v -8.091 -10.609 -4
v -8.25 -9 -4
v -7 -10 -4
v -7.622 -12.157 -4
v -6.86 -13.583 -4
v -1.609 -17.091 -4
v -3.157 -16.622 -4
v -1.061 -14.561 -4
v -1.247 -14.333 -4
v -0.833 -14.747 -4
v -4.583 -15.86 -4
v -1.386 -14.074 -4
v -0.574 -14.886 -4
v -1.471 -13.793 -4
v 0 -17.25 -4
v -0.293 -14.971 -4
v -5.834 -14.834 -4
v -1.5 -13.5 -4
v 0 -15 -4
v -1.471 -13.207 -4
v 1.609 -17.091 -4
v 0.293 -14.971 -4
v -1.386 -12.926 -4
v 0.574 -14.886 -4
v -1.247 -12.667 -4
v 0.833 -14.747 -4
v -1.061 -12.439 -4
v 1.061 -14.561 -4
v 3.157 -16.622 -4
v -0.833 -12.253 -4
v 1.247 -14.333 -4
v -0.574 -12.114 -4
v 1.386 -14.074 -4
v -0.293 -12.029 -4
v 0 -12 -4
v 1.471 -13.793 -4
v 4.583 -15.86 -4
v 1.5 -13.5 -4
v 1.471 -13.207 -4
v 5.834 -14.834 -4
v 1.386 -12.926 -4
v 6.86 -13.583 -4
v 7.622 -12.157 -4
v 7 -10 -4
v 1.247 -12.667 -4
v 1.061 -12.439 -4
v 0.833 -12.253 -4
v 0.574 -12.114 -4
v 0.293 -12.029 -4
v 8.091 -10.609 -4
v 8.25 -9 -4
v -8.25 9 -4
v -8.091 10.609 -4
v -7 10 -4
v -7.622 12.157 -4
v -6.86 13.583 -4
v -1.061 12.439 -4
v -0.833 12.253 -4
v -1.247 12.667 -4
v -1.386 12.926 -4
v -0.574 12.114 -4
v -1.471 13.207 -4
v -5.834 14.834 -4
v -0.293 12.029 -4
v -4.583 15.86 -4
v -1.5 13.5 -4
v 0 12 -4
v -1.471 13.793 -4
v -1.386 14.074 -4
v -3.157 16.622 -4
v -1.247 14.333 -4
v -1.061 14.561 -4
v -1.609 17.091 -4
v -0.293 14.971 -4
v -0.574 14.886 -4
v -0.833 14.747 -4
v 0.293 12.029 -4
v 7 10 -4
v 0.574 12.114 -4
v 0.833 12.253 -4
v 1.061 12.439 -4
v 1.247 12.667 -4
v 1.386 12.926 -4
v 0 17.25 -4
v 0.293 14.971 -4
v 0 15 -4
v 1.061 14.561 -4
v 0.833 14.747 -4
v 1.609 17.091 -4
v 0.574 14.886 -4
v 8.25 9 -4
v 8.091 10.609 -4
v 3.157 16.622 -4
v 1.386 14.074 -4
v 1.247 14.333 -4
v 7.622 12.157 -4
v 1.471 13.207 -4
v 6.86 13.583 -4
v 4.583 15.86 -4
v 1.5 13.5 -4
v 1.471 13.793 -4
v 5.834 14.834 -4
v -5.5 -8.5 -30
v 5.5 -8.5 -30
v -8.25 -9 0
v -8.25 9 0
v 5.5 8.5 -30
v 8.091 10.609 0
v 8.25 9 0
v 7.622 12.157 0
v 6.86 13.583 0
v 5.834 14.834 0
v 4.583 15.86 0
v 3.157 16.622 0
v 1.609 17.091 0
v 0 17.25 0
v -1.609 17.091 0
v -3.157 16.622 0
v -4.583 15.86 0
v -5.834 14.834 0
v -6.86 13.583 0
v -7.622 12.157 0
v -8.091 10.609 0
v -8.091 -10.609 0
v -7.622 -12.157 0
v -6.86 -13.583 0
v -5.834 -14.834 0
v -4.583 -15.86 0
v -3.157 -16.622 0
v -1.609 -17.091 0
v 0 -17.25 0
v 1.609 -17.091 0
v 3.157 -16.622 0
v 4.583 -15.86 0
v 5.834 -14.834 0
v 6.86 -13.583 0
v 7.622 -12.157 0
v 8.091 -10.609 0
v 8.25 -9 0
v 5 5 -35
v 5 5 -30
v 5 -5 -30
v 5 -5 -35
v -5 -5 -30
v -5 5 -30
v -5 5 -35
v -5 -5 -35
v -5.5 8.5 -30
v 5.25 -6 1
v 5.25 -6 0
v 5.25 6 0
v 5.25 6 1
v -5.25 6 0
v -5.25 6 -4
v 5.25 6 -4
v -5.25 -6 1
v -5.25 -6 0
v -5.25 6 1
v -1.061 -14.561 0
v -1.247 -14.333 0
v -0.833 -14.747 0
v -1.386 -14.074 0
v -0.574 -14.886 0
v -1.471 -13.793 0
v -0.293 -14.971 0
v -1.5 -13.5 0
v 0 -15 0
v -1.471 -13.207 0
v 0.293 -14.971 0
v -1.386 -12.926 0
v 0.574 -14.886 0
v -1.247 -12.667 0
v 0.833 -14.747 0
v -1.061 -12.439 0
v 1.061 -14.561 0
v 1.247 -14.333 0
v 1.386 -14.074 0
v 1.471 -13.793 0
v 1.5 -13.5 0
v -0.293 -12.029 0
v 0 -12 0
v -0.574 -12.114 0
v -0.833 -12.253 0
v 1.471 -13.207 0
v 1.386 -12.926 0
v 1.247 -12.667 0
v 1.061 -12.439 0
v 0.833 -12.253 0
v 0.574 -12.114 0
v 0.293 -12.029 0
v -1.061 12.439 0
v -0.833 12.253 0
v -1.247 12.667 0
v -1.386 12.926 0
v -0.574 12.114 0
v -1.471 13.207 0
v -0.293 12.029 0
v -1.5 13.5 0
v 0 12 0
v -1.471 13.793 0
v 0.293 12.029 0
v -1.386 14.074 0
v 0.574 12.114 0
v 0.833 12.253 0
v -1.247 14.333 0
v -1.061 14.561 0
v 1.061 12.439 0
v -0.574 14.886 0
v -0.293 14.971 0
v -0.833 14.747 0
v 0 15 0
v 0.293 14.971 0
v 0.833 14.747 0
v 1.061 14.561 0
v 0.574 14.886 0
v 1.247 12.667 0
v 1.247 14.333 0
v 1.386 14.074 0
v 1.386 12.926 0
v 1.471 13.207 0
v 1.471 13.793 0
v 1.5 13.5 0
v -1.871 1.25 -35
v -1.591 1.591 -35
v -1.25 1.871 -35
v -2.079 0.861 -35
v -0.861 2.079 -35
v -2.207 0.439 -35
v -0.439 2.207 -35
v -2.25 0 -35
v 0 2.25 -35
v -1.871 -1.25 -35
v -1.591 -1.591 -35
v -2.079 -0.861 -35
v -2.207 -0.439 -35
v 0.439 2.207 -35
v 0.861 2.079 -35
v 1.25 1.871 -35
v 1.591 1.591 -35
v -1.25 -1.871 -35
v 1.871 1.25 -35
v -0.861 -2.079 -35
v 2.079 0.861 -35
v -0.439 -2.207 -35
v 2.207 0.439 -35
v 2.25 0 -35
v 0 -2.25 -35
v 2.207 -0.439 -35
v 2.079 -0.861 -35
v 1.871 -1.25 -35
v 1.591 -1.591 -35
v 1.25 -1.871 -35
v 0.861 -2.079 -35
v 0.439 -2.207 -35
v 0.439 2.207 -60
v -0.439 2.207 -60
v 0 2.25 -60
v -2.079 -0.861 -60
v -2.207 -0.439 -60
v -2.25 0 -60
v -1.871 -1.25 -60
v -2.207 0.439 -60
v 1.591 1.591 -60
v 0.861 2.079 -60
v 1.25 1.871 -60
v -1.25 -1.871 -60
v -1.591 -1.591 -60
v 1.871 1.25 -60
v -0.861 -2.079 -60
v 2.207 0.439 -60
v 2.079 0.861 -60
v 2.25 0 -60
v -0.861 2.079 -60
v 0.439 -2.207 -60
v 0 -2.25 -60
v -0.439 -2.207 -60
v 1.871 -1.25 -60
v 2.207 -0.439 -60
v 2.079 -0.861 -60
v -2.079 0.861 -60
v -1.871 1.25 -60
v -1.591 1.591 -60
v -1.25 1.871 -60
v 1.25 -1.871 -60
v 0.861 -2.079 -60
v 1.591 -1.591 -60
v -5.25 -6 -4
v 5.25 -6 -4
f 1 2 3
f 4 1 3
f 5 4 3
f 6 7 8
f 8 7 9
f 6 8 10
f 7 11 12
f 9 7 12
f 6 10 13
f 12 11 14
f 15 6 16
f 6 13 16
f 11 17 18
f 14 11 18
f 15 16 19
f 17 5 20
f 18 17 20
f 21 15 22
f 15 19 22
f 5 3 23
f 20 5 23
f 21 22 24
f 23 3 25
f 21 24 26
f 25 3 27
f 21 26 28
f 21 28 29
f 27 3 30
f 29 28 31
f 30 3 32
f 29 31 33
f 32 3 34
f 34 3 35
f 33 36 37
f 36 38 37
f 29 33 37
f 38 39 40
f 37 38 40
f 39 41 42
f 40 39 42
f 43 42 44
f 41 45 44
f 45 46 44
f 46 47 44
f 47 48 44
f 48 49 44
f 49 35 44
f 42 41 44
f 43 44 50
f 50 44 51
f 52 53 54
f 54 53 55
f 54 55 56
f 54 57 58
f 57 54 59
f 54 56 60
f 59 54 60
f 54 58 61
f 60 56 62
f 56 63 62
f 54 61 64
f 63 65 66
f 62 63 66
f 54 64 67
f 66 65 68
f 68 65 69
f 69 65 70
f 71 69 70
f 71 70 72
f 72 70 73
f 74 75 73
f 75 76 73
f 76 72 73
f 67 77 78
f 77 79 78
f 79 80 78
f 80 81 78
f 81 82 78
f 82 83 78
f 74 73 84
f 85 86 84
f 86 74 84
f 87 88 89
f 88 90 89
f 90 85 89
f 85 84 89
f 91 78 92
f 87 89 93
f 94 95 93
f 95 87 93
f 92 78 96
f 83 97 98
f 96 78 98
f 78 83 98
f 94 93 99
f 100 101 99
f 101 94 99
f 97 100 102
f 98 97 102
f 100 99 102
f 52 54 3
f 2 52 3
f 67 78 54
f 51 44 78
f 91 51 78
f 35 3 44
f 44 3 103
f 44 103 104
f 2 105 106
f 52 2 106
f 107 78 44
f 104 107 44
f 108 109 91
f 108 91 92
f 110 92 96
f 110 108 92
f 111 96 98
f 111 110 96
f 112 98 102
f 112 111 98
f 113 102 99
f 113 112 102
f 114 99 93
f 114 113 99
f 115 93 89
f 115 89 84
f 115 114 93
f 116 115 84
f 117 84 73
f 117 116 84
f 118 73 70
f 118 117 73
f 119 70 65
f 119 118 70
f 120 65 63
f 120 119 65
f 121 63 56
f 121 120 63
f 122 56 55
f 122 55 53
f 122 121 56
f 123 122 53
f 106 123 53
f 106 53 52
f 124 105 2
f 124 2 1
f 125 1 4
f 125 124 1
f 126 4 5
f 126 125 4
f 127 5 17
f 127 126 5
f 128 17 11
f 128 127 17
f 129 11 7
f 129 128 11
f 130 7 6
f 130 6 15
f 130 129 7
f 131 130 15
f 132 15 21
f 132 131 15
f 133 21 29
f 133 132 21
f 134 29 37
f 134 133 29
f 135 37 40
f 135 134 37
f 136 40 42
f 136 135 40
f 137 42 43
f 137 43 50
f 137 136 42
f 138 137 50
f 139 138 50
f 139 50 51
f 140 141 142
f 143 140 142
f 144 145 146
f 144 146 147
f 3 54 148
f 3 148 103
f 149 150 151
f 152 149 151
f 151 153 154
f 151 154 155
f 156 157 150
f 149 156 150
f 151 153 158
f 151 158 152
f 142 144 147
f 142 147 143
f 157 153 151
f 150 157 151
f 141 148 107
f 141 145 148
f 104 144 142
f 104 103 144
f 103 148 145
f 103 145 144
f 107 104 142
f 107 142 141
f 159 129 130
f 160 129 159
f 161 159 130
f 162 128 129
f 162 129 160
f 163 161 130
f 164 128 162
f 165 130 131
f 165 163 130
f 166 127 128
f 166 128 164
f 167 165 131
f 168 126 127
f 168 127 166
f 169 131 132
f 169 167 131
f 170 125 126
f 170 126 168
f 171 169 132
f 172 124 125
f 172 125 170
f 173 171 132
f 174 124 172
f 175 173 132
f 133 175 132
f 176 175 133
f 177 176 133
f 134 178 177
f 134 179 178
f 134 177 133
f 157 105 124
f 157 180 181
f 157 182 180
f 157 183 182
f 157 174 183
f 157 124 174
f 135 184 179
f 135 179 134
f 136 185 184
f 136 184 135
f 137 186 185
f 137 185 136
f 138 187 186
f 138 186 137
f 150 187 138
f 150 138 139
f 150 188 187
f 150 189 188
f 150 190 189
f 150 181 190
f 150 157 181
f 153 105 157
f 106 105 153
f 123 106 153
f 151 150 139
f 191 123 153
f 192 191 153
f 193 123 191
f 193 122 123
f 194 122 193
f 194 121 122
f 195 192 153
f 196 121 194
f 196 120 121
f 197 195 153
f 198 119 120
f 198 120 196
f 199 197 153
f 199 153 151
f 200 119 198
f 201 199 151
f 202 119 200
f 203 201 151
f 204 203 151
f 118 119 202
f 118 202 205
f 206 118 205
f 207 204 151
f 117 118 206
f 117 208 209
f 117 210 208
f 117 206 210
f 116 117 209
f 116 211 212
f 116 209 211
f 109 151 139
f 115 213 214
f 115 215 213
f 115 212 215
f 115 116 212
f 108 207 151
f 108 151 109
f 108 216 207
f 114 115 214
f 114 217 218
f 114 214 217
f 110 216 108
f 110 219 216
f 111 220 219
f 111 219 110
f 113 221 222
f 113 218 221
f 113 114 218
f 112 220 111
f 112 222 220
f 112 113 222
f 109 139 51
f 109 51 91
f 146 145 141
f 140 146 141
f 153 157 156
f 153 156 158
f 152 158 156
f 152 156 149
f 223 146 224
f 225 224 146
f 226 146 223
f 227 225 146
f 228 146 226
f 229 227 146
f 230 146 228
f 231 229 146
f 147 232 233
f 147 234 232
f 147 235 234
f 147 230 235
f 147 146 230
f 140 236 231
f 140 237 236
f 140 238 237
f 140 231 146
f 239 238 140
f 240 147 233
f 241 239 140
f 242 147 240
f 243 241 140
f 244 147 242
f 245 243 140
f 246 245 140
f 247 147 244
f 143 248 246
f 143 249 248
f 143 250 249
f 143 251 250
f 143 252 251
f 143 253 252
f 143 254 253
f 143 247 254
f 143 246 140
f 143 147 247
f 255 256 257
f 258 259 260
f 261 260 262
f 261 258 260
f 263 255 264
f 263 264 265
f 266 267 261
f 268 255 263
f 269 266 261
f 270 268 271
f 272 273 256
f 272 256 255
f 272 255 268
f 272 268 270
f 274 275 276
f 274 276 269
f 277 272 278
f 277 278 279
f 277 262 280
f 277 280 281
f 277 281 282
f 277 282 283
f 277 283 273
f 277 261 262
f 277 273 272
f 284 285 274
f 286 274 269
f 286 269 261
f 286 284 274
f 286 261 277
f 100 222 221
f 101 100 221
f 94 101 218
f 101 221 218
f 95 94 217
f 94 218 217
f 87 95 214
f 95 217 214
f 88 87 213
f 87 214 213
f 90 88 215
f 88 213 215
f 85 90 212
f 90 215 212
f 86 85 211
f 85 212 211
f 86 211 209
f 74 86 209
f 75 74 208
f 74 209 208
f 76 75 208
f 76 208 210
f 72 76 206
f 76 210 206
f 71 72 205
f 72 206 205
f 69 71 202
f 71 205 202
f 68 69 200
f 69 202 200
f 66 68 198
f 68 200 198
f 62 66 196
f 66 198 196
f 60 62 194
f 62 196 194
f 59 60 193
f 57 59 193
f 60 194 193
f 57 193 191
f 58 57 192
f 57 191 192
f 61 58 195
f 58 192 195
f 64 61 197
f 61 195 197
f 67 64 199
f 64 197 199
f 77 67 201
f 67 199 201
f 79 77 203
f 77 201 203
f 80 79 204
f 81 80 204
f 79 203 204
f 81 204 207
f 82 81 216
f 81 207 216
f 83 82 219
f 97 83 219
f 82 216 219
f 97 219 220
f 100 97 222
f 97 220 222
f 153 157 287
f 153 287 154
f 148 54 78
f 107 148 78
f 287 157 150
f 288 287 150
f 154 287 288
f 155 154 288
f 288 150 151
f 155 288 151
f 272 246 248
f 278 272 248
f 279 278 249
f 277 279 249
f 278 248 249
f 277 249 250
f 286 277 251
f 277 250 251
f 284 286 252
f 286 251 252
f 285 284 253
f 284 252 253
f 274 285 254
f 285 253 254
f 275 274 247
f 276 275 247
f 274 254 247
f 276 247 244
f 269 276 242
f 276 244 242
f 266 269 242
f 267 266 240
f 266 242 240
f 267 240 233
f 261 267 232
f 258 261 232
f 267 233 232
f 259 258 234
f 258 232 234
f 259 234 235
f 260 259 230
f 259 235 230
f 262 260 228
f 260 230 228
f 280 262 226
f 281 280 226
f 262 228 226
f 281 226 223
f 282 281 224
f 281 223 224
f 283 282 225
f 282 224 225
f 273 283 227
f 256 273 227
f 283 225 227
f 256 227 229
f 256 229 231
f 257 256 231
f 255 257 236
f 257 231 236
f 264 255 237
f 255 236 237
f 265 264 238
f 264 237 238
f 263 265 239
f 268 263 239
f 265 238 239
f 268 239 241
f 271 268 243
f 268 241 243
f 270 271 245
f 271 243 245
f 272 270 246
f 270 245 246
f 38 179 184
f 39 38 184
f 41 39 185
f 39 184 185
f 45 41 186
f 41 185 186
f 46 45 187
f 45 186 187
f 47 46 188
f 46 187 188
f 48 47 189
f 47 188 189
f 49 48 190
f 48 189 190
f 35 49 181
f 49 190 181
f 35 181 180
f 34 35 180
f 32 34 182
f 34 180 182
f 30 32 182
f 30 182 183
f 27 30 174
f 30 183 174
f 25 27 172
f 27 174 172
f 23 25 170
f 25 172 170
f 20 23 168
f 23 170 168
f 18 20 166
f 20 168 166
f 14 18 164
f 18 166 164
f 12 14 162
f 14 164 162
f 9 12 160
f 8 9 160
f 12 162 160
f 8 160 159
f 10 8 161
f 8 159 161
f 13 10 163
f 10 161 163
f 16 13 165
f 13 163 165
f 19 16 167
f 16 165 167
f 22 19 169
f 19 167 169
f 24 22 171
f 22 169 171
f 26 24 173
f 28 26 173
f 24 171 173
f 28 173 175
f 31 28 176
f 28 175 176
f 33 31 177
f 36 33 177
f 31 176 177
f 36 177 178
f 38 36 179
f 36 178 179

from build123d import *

# Parameters (mm, degrees)
F0_W      = 16.5
F0_H      = 18
F0_W_2    = 10.5
F0_H_2    = 12
F0_R      = 1.5
F1_DEPTH  = 4
F2_W      = 14
F2_H      = 20
F3_DEPTH  = 26
F4_SIZE2  = 25.99999
F4_SIZE   = 1.49999
F5_W      = 10
F5_H      = 10
F6_DEPTH  = 5
F7_R      = 2.25
F8_DEPTH  = 25
F9_W      = 10.5
F9_H      = 12
F10_DEPTH = 1


# Not quite as in the source:
# - a fillet or chamfer is up to 0.001 mm smaller than in the source, because OpenCascade refuses the exact size


with BuildPart() as f1:
    # F0 (on Top) → F1 (new body)
    with BuildSketch(Plane.XY):
        Rectangle(F0_W, F0_H)
        Rectangle(F0_W_2, F0_H_2, mode=Mode.SUBTRACT)
        with BuildLine():
            Line((-8.25, 9), (8.25, 9))
            ThreePointArc((8.25, 9), (0, 17.25), (-8.25, 9))
        make_face()
        with Locations((0, 13.5)):
            Circle(F0_R, mode=Mode.SUBTRACT)
        with BuildLine():
            ThreePointArc((-8.25, -9), (0, -17.25), (8.25, -9))
            Line((8.25, -9), (-8.25, -9))
        make_face()
        with Locations((0, -13.5)):
            Circle(F0_R, mode=Mode.SUBTRACT)
    extrude(amount=-F1_DEPTH)

    # F2 (on face) → F3 (join)
    with BuildSketch(Plane(origin=(0, 0, -4), x_dir=(1, 0, 0), z_dir=(0, 0, -1))):
        Rectangle(F2_W, F2_H)
    extrude(amount=F3_DEPTH)

    # F4 (size 1.5 and 26 in the source; OpenCascade refuses exactly that, so slightly less here)
    f4_edges = [f1.edges().sort_by_distance(p)[0] for p in [
        (0, -10, -30),
        (0, 10, -30),
        (7, 0, -30),
        (-7, 0, -30),
    ]]
    f4_side = f1.faces().sort_by_distance((0, 0, -30))[0]
    chamfer(f4_edges, length=F4_SIZE, length2=F4_SIZE2, reference=f4_side)

    # F5 (on face) → F6 (join)
    with BuildSketch(Plane(origin=(0, 0, -30), x_dir=(1, 0, 0), z_dir=(0, 0, -1))):
        Rectangle(F5_W, F5_H)
    extrude(amount=F6_DEPTH)

    # F7 (on face) → F8 (join)
    with BuildSketch(Plane(origin=(0, 0, -35), x_dir=(1, 0, 0), z_dir=(0, 0, -1))):
        Circle(F7_R)
    extrude(amount=F8_DEPTH)

    # F9 (on face) → F10 (join)
    with BuildSketch(Plane.XY):
        Rectangle(F9_W, F9_H)
    extrude(amount=F10_DEPTH)


solid = f1.part
